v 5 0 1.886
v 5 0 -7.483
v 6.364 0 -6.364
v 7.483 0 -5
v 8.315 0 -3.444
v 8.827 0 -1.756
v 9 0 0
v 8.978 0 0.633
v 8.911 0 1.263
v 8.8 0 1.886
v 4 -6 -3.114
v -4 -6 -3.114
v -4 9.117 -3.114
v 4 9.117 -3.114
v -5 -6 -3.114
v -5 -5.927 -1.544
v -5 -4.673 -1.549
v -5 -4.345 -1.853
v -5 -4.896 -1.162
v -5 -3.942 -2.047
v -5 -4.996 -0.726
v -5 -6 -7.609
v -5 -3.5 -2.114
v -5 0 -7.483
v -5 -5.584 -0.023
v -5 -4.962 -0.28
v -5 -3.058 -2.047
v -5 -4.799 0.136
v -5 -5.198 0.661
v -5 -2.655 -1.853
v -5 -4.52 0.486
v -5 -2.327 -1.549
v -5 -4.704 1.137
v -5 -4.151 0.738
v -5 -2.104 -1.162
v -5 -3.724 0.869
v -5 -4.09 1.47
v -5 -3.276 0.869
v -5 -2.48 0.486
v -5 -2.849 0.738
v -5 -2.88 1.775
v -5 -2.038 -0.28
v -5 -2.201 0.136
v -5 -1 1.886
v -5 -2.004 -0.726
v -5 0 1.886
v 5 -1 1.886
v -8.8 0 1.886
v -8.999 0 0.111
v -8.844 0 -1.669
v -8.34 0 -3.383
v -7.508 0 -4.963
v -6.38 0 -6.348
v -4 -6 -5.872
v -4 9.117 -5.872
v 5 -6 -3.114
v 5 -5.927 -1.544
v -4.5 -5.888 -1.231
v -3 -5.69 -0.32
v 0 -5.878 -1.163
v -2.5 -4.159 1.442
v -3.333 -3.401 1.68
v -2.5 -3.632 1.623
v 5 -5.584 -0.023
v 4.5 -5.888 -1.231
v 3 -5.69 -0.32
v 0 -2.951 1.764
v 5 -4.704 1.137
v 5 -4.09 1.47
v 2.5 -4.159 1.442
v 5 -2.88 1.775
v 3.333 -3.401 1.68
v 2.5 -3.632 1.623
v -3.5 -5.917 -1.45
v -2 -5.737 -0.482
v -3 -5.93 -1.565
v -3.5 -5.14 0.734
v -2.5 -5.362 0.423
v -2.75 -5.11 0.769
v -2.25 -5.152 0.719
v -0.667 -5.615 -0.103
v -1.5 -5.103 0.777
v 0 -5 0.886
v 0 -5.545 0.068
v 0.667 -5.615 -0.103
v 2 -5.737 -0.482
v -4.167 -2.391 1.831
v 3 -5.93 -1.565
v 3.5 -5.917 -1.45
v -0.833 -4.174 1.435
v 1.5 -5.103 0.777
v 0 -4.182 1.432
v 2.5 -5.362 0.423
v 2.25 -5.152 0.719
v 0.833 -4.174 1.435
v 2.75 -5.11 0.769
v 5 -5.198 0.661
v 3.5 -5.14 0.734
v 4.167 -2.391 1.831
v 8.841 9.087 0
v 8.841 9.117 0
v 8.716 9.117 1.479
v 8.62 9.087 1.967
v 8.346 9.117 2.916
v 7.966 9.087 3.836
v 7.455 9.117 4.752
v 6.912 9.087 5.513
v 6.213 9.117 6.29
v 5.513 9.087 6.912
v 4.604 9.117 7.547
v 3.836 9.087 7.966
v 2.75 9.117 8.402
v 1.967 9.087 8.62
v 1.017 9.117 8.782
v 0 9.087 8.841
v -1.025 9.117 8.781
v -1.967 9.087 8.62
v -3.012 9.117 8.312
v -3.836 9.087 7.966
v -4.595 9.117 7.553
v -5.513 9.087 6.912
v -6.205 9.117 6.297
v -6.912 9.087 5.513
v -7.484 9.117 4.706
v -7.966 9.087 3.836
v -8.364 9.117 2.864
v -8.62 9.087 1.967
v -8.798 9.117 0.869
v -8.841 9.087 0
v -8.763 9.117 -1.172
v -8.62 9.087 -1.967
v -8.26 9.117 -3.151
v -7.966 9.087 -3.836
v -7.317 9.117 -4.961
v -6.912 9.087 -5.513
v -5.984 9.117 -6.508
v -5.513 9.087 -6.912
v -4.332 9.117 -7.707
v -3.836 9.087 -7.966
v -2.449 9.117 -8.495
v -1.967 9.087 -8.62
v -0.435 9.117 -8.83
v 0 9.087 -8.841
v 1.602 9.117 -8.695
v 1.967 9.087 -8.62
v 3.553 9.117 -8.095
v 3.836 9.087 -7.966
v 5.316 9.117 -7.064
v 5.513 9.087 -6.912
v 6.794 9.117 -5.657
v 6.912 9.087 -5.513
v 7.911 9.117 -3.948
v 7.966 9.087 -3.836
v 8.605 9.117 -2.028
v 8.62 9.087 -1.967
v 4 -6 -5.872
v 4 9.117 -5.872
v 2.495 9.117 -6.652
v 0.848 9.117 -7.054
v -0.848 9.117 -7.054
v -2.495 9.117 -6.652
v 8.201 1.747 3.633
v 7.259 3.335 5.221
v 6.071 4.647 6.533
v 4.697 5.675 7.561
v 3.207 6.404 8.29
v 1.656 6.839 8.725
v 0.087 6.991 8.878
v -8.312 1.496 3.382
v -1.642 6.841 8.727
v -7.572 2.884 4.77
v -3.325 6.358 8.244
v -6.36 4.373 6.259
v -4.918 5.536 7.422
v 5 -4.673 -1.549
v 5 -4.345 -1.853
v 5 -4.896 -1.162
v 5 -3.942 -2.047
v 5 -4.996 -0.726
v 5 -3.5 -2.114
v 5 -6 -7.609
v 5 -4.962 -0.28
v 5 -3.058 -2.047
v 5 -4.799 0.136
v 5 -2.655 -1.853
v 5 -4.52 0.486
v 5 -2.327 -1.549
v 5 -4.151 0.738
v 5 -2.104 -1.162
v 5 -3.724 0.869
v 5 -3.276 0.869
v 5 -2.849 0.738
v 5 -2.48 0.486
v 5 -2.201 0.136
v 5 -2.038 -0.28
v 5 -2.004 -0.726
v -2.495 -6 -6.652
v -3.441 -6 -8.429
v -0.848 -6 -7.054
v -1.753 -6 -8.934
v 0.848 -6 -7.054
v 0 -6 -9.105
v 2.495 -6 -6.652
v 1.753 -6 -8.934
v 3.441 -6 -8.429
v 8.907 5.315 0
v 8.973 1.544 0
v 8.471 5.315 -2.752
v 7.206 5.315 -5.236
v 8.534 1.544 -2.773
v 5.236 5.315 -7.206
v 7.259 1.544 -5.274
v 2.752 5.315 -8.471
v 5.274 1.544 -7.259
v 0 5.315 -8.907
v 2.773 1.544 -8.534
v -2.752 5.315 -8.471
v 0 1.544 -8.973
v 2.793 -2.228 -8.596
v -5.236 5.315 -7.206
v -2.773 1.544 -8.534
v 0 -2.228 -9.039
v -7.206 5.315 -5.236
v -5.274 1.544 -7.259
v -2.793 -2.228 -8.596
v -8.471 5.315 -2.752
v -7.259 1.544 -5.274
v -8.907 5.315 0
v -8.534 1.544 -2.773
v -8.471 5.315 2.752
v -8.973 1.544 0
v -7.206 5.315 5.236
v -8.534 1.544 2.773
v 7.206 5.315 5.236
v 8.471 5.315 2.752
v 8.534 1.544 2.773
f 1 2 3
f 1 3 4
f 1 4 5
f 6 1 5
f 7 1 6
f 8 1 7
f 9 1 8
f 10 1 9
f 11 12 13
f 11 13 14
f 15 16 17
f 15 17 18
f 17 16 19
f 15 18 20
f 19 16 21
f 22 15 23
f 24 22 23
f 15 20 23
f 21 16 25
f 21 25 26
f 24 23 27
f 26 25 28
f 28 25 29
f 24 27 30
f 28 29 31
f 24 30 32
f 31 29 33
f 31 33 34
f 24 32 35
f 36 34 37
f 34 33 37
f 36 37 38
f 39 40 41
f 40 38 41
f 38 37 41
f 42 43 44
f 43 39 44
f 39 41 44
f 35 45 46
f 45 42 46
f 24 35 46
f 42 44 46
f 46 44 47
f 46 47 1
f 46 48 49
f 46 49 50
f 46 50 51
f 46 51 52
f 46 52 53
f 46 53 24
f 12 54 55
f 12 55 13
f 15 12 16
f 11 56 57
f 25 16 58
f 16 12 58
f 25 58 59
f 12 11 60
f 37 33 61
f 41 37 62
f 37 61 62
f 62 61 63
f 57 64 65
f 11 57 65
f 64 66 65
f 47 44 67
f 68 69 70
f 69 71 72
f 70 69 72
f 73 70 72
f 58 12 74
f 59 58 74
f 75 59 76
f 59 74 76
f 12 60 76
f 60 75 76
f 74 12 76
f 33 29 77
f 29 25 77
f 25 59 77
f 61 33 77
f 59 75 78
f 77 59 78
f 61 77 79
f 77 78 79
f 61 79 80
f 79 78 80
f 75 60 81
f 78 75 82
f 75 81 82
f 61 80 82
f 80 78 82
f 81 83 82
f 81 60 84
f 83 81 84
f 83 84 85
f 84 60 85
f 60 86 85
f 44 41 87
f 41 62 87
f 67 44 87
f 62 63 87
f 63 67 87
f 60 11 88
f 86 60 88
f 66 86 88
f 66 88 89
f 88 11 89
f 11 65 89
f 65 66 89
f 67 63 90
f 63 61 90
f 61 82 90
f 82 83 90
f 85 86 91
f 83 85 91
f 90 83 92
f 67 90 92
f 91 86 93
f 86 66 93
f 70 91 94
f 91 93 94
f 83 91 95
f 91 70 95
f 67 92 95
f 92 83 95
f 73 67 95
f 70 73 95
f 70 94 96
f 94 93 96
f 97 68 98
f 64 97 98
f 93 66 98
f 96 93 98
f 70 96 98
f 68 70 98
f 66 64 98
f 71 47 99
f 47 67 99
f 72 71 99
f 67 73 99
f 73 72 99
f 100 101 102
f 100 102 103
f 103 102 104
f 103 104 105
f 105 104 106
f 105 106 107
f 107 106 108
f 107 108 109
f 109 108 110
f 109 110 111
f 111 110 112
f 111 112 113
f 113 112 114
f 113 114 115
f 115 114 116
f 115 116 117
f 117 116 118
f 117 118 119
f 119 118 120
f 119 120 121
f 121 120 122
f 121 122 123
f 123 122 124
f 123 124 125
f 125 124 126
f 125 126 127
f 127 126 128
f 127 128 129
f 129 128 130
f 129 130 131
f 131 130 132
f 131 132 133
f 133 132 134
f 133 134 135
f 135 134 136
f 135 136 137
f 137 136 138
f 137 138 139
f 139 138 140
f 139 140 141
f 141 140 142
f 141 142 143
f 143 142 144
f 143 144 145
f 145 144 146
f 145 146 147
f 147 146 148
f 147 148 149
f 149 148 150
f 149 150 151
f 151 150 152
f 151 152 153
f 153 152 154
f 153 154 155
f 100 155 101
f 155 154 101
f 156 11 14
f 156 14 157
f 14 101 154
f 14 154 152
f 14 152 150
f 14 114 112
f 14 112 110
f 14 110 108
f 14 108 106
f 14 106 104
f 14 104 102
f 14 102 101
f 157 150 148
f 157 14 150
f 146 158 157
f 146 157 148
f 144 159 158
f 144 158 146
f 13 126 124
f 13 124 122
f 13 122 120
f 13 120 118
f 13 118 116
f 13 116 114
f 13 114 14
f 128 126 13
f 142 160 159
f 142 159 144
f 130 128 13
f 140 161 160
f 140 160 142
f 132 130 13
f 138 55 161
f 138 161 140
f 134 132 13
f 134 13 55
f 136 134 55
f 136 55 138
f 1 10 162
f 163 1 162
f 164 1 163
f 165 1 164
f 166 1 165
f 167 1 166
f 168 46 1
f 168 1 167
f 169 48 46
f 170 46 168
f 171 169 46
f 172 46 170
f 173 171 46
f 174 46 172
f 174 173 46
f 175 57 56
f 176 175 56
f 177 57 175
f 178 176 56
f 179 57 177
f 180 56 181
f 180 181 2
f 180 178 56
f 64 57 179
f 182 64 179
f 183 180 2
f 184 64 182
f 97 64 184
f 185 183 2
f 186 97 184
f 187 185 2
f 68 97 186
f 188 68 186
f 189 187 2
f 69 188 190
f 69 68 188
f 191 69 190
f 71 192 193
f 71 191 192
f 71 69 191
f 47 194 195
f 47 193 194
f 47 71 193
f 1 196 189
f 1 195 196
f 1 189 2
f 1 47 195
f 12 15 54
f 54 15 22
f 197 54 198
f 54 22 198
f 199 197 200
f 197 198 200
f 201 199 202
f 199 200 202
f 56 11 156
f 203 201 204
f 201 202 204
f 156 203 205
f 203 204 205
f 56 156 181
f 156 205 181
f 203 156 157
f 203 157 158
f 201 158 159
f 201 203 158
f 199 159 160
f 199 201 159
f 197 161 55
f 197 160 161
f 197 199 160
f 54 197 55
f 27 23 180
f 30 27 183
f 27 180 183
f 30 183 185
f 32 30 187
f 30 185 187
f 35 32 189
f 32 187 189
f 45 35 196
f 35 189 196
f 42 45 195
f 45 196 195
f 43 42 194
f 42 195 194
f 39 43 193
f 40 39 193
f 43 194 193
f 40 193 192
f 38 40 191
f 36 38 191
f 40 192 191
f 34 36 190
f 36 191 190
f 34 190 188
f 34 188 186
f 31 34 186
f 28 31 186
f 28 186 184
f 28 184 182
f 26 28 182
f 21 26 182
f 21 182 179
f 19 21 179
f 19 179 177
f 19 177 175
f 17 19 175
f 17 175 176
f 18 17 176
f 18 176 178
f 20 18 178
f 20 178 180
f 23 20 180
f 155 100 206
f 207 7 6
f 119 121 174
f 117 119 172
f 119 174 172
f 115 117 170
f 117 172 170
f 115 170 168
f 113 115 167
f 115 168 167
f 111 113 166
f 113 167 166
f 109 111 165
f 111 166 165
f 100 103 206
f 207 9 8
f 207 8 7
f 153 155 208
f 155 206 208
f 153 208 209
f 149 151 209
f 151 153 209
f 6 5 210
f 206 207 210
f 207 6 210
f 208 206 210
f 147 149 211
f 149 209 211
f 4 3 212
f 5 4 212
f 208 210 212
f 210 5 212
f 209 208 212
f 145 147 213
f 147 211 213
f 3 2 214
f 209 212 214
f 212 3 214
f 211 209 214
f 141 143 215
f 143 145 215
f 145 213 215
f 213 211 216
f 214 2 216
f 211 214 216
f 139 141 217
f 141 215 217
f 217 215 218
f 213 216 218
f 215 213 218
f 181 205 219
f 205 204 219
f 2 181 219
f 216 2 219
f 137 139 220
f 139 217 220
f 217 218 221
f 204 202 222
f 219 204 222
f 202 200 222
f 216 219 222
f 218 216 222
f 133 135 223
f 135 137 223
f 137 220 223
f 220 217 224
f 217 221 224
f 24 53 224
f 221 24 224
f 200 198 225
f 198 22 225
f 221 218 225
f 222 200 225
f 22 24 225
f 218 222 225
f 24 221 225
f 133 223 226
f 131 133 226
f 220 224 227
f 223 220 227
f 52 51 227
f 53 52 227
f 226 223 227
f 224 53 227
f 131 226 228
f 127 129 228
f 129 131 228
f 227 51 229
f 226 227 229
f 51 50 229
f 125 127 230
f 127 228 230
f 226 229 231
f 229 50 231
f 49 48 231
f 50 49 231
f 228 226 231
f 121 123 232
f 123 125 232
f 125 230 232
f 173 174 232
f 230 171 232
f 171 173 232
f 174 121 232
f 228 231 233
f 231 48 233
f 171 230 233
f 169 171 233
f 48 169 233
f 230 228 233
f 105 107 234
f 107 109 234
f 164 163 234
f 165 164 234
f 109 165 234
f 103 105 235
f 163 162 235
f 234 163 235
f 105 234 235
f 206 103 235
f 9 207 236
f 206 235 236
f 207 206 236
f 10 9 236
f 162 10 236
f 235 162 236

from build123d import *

# Parameters (mm, degrees)
SKETCH1_R                     = 9
BOSS_EXTRUDE1_DEPTH           = 19
BOSS_EXTRUDE1_TAPER           = 1
BOSS_EXTRUDE1_OTHER_WAY_DEPTH = 6
BOSS_EXTRUDE1_OTHER_WAY_TAPER = -1
CUT_EXTRUDE1_DEPTH            = 23.951954839
CUT_EXTRUDE1_DEPTH_BACK       = 23.951954839
SKETCH4_W                     = 6.502745185
SKETCH4_H                     = 6
CUT_EXTRUDE2_DEPTH            = 24.763281499
SKETCH5_R                     = 1.5
CUT_EXTRUDE3_DEPTH            = 26.296168166
FILLET1_SIZE                  = 5
CUT_EXTRUDE4_DEPTH            = 23.910611578
CUT_EXTRUDE4_DEPTH_BACK       = 23.910611578
SKETCH6_W                     = 24.694280634
SKETCH6_H                     = 10.883453579
CUT_EXTRUDE5_DEPTH            = 20.809242737


with BuildPart() as part:
    # Sketch1 → Boss-Extrude1 (new body)
    with BuildSketch(Plane(origin=(0, 0, 0), x_dir=(1, 0, 0), z_dir=(0, 1, 0))):
        Circle(SKETCH1_R)
    extrude(amount=BOSS_EXTRUDE1_DEPTH, taper=BOSS_EXTRUDE1_TAPER)

    # Sketch1 → Boss-Extrude1 other way (add)
    with BuildSketch(Plane(origin=(0, 0, 0), x_dir=(1, 0, 0), z_dir=(0, 1, 0))):
        Circle(SKETCH1_R)
    extrude(amount=-BOSS_EXTRUDE1_OTHER_WAY_DEPTH, taper=BOSS_EXTRUDE1_OTHER_WAY_TAPER)

    # Sketch3 → Cut-Extrude1 (cut, two sides: drawn at the far end of the back side and taken through both)
    with BuildSketch(Plane(origin=(0, 0, 0), x_dir=(0, 0, -1), z_dir=(1, 0, 0)).offset(-CUT_EXTRUDE1_DEPTH_BACK)):
        Polygon((-1.886057768, -6), (-1.886057768, 0), (-9.929766736, 8.043708969), (-9.929766736, -6), align=None)
    extrude(amount=CUT_EXTRUDE1_DEPTH + CUT_EXTRUDE1_DEPTH_BACK, mode=Mode.SUBTRACT)

    # Sketch4 → Cut-Extrude2 (cut, through all)
    with BuildSketch(Plane.XY.offset(1.886057768)):
        with Locations((-8.251372593, -3)):
            Rectangle(SKETCH4_W, SKETCH4_H)
        with Locations((8.251372593, -3)):
            Rectangle(SKETCH4_W, SKETCH4_H)
    extrude(amount=-CUT_EXTRUDE2_DEPTH, mode=Mode.SUBTRACT)

    # Sketch5 → Cut-Extrude3 (cut, through all)
    with BuildSketch(Plane(origin=(5, 0, 0), x_dir=(0, 0, -1), z_dir=(1, 0, 0))):
        with Locations((0.613942232, -3.5)):
            Circle(SKETCH5_R)
    extrude(amount=-CUT_EXTRUDE3_DEPTH, mode=Mode.SUBTRACT)

    # Fillet1
    # a fillet whose section is not a circle: 5 mm, written as the material it takes off along each edge
    with BuildSketch(Plane(origin=(17.5, -6, 1.886057768), x_dir=(0, 0, -1), z_dir=(-1, 0, 0))) as fillet1_piece_1:
        with BuildLine():
            Bezier((FILLET1_SIZE, 0), (0, 0), (0, -FILLET1_SIZE), weights=[1, 1.5, 1])
            Line((0, -FILLET1_SIZE), (0, 0))
            Line((0, 0), (FILLET1_SIZE, 0))
        make_face()
    extrude(amount=35, mode=Mode.SUBTRACT)

    # Fillet2
    # a fillet whose section is not a circle: 10, 5 mm, written as the material it takes off along each edge
    with BuildSketch(Plane(origin=(0, 19, 0), x_dir=(1, 0, 0), z_dir=(0, 0, -1))) as fillet2_piece_1:
        with BuildLine():
            Bezier((8.841381251, 9.912737968), (8.668353766, 0), (3.842142775, 0), weights=[1, 0.818181818, 1])
            Line((3.842142775, 0), (8.668353766, 0))
            Line((8.668353766, 0), (8.841381251, 9.912737968))
        make_face()
    revolve(axis=Axis((0, 19, 0), (0, -1, 0)), mode=Mode.SUBTRACT)

    # Sketch6 → Cut-Extrude4 (cut, two sides: drawn at the far end of the back side and taken through both)
    with BuildSketch(Plane(origin=(0, 0, 0), x_dir=(0, 0, -1), z_dir=(1, 0, 0)).offset(-CUT_EXTRUDE4_DEPTH_BACK)):
        with Locations((1.854254765, 14.558273211)):
            Rectangle(SKETCH6_W, SKETCH6_H)
    extrude(amount=CUT_EXTRUDE4_DEPTH + CUT_EXTRUDE4_DEPTH_BACK, mode=Mode.SUBTRACT)

    # Sketch7 → Cut-Extrude5 (cut, through all)
    with BuildSketch(Plane.XZ.offset(6)):
        with BuildLine():
            Line((4, -3.113942232), (4, -5.871728358))
            ThreePointArc((4, -5.871728358), (0, -7.10473039), (-4, -5.871728358))
            Line((-4, -5.871728358), (-4, -3.113942232))
            Line((-4, -3.113942232), (4, -3.113942232))
        make_face()
    extrude(amount=-CUT_EXTRUDE5_DEPTH, mode=Mode.SUBTRACT)


solid = part.part
